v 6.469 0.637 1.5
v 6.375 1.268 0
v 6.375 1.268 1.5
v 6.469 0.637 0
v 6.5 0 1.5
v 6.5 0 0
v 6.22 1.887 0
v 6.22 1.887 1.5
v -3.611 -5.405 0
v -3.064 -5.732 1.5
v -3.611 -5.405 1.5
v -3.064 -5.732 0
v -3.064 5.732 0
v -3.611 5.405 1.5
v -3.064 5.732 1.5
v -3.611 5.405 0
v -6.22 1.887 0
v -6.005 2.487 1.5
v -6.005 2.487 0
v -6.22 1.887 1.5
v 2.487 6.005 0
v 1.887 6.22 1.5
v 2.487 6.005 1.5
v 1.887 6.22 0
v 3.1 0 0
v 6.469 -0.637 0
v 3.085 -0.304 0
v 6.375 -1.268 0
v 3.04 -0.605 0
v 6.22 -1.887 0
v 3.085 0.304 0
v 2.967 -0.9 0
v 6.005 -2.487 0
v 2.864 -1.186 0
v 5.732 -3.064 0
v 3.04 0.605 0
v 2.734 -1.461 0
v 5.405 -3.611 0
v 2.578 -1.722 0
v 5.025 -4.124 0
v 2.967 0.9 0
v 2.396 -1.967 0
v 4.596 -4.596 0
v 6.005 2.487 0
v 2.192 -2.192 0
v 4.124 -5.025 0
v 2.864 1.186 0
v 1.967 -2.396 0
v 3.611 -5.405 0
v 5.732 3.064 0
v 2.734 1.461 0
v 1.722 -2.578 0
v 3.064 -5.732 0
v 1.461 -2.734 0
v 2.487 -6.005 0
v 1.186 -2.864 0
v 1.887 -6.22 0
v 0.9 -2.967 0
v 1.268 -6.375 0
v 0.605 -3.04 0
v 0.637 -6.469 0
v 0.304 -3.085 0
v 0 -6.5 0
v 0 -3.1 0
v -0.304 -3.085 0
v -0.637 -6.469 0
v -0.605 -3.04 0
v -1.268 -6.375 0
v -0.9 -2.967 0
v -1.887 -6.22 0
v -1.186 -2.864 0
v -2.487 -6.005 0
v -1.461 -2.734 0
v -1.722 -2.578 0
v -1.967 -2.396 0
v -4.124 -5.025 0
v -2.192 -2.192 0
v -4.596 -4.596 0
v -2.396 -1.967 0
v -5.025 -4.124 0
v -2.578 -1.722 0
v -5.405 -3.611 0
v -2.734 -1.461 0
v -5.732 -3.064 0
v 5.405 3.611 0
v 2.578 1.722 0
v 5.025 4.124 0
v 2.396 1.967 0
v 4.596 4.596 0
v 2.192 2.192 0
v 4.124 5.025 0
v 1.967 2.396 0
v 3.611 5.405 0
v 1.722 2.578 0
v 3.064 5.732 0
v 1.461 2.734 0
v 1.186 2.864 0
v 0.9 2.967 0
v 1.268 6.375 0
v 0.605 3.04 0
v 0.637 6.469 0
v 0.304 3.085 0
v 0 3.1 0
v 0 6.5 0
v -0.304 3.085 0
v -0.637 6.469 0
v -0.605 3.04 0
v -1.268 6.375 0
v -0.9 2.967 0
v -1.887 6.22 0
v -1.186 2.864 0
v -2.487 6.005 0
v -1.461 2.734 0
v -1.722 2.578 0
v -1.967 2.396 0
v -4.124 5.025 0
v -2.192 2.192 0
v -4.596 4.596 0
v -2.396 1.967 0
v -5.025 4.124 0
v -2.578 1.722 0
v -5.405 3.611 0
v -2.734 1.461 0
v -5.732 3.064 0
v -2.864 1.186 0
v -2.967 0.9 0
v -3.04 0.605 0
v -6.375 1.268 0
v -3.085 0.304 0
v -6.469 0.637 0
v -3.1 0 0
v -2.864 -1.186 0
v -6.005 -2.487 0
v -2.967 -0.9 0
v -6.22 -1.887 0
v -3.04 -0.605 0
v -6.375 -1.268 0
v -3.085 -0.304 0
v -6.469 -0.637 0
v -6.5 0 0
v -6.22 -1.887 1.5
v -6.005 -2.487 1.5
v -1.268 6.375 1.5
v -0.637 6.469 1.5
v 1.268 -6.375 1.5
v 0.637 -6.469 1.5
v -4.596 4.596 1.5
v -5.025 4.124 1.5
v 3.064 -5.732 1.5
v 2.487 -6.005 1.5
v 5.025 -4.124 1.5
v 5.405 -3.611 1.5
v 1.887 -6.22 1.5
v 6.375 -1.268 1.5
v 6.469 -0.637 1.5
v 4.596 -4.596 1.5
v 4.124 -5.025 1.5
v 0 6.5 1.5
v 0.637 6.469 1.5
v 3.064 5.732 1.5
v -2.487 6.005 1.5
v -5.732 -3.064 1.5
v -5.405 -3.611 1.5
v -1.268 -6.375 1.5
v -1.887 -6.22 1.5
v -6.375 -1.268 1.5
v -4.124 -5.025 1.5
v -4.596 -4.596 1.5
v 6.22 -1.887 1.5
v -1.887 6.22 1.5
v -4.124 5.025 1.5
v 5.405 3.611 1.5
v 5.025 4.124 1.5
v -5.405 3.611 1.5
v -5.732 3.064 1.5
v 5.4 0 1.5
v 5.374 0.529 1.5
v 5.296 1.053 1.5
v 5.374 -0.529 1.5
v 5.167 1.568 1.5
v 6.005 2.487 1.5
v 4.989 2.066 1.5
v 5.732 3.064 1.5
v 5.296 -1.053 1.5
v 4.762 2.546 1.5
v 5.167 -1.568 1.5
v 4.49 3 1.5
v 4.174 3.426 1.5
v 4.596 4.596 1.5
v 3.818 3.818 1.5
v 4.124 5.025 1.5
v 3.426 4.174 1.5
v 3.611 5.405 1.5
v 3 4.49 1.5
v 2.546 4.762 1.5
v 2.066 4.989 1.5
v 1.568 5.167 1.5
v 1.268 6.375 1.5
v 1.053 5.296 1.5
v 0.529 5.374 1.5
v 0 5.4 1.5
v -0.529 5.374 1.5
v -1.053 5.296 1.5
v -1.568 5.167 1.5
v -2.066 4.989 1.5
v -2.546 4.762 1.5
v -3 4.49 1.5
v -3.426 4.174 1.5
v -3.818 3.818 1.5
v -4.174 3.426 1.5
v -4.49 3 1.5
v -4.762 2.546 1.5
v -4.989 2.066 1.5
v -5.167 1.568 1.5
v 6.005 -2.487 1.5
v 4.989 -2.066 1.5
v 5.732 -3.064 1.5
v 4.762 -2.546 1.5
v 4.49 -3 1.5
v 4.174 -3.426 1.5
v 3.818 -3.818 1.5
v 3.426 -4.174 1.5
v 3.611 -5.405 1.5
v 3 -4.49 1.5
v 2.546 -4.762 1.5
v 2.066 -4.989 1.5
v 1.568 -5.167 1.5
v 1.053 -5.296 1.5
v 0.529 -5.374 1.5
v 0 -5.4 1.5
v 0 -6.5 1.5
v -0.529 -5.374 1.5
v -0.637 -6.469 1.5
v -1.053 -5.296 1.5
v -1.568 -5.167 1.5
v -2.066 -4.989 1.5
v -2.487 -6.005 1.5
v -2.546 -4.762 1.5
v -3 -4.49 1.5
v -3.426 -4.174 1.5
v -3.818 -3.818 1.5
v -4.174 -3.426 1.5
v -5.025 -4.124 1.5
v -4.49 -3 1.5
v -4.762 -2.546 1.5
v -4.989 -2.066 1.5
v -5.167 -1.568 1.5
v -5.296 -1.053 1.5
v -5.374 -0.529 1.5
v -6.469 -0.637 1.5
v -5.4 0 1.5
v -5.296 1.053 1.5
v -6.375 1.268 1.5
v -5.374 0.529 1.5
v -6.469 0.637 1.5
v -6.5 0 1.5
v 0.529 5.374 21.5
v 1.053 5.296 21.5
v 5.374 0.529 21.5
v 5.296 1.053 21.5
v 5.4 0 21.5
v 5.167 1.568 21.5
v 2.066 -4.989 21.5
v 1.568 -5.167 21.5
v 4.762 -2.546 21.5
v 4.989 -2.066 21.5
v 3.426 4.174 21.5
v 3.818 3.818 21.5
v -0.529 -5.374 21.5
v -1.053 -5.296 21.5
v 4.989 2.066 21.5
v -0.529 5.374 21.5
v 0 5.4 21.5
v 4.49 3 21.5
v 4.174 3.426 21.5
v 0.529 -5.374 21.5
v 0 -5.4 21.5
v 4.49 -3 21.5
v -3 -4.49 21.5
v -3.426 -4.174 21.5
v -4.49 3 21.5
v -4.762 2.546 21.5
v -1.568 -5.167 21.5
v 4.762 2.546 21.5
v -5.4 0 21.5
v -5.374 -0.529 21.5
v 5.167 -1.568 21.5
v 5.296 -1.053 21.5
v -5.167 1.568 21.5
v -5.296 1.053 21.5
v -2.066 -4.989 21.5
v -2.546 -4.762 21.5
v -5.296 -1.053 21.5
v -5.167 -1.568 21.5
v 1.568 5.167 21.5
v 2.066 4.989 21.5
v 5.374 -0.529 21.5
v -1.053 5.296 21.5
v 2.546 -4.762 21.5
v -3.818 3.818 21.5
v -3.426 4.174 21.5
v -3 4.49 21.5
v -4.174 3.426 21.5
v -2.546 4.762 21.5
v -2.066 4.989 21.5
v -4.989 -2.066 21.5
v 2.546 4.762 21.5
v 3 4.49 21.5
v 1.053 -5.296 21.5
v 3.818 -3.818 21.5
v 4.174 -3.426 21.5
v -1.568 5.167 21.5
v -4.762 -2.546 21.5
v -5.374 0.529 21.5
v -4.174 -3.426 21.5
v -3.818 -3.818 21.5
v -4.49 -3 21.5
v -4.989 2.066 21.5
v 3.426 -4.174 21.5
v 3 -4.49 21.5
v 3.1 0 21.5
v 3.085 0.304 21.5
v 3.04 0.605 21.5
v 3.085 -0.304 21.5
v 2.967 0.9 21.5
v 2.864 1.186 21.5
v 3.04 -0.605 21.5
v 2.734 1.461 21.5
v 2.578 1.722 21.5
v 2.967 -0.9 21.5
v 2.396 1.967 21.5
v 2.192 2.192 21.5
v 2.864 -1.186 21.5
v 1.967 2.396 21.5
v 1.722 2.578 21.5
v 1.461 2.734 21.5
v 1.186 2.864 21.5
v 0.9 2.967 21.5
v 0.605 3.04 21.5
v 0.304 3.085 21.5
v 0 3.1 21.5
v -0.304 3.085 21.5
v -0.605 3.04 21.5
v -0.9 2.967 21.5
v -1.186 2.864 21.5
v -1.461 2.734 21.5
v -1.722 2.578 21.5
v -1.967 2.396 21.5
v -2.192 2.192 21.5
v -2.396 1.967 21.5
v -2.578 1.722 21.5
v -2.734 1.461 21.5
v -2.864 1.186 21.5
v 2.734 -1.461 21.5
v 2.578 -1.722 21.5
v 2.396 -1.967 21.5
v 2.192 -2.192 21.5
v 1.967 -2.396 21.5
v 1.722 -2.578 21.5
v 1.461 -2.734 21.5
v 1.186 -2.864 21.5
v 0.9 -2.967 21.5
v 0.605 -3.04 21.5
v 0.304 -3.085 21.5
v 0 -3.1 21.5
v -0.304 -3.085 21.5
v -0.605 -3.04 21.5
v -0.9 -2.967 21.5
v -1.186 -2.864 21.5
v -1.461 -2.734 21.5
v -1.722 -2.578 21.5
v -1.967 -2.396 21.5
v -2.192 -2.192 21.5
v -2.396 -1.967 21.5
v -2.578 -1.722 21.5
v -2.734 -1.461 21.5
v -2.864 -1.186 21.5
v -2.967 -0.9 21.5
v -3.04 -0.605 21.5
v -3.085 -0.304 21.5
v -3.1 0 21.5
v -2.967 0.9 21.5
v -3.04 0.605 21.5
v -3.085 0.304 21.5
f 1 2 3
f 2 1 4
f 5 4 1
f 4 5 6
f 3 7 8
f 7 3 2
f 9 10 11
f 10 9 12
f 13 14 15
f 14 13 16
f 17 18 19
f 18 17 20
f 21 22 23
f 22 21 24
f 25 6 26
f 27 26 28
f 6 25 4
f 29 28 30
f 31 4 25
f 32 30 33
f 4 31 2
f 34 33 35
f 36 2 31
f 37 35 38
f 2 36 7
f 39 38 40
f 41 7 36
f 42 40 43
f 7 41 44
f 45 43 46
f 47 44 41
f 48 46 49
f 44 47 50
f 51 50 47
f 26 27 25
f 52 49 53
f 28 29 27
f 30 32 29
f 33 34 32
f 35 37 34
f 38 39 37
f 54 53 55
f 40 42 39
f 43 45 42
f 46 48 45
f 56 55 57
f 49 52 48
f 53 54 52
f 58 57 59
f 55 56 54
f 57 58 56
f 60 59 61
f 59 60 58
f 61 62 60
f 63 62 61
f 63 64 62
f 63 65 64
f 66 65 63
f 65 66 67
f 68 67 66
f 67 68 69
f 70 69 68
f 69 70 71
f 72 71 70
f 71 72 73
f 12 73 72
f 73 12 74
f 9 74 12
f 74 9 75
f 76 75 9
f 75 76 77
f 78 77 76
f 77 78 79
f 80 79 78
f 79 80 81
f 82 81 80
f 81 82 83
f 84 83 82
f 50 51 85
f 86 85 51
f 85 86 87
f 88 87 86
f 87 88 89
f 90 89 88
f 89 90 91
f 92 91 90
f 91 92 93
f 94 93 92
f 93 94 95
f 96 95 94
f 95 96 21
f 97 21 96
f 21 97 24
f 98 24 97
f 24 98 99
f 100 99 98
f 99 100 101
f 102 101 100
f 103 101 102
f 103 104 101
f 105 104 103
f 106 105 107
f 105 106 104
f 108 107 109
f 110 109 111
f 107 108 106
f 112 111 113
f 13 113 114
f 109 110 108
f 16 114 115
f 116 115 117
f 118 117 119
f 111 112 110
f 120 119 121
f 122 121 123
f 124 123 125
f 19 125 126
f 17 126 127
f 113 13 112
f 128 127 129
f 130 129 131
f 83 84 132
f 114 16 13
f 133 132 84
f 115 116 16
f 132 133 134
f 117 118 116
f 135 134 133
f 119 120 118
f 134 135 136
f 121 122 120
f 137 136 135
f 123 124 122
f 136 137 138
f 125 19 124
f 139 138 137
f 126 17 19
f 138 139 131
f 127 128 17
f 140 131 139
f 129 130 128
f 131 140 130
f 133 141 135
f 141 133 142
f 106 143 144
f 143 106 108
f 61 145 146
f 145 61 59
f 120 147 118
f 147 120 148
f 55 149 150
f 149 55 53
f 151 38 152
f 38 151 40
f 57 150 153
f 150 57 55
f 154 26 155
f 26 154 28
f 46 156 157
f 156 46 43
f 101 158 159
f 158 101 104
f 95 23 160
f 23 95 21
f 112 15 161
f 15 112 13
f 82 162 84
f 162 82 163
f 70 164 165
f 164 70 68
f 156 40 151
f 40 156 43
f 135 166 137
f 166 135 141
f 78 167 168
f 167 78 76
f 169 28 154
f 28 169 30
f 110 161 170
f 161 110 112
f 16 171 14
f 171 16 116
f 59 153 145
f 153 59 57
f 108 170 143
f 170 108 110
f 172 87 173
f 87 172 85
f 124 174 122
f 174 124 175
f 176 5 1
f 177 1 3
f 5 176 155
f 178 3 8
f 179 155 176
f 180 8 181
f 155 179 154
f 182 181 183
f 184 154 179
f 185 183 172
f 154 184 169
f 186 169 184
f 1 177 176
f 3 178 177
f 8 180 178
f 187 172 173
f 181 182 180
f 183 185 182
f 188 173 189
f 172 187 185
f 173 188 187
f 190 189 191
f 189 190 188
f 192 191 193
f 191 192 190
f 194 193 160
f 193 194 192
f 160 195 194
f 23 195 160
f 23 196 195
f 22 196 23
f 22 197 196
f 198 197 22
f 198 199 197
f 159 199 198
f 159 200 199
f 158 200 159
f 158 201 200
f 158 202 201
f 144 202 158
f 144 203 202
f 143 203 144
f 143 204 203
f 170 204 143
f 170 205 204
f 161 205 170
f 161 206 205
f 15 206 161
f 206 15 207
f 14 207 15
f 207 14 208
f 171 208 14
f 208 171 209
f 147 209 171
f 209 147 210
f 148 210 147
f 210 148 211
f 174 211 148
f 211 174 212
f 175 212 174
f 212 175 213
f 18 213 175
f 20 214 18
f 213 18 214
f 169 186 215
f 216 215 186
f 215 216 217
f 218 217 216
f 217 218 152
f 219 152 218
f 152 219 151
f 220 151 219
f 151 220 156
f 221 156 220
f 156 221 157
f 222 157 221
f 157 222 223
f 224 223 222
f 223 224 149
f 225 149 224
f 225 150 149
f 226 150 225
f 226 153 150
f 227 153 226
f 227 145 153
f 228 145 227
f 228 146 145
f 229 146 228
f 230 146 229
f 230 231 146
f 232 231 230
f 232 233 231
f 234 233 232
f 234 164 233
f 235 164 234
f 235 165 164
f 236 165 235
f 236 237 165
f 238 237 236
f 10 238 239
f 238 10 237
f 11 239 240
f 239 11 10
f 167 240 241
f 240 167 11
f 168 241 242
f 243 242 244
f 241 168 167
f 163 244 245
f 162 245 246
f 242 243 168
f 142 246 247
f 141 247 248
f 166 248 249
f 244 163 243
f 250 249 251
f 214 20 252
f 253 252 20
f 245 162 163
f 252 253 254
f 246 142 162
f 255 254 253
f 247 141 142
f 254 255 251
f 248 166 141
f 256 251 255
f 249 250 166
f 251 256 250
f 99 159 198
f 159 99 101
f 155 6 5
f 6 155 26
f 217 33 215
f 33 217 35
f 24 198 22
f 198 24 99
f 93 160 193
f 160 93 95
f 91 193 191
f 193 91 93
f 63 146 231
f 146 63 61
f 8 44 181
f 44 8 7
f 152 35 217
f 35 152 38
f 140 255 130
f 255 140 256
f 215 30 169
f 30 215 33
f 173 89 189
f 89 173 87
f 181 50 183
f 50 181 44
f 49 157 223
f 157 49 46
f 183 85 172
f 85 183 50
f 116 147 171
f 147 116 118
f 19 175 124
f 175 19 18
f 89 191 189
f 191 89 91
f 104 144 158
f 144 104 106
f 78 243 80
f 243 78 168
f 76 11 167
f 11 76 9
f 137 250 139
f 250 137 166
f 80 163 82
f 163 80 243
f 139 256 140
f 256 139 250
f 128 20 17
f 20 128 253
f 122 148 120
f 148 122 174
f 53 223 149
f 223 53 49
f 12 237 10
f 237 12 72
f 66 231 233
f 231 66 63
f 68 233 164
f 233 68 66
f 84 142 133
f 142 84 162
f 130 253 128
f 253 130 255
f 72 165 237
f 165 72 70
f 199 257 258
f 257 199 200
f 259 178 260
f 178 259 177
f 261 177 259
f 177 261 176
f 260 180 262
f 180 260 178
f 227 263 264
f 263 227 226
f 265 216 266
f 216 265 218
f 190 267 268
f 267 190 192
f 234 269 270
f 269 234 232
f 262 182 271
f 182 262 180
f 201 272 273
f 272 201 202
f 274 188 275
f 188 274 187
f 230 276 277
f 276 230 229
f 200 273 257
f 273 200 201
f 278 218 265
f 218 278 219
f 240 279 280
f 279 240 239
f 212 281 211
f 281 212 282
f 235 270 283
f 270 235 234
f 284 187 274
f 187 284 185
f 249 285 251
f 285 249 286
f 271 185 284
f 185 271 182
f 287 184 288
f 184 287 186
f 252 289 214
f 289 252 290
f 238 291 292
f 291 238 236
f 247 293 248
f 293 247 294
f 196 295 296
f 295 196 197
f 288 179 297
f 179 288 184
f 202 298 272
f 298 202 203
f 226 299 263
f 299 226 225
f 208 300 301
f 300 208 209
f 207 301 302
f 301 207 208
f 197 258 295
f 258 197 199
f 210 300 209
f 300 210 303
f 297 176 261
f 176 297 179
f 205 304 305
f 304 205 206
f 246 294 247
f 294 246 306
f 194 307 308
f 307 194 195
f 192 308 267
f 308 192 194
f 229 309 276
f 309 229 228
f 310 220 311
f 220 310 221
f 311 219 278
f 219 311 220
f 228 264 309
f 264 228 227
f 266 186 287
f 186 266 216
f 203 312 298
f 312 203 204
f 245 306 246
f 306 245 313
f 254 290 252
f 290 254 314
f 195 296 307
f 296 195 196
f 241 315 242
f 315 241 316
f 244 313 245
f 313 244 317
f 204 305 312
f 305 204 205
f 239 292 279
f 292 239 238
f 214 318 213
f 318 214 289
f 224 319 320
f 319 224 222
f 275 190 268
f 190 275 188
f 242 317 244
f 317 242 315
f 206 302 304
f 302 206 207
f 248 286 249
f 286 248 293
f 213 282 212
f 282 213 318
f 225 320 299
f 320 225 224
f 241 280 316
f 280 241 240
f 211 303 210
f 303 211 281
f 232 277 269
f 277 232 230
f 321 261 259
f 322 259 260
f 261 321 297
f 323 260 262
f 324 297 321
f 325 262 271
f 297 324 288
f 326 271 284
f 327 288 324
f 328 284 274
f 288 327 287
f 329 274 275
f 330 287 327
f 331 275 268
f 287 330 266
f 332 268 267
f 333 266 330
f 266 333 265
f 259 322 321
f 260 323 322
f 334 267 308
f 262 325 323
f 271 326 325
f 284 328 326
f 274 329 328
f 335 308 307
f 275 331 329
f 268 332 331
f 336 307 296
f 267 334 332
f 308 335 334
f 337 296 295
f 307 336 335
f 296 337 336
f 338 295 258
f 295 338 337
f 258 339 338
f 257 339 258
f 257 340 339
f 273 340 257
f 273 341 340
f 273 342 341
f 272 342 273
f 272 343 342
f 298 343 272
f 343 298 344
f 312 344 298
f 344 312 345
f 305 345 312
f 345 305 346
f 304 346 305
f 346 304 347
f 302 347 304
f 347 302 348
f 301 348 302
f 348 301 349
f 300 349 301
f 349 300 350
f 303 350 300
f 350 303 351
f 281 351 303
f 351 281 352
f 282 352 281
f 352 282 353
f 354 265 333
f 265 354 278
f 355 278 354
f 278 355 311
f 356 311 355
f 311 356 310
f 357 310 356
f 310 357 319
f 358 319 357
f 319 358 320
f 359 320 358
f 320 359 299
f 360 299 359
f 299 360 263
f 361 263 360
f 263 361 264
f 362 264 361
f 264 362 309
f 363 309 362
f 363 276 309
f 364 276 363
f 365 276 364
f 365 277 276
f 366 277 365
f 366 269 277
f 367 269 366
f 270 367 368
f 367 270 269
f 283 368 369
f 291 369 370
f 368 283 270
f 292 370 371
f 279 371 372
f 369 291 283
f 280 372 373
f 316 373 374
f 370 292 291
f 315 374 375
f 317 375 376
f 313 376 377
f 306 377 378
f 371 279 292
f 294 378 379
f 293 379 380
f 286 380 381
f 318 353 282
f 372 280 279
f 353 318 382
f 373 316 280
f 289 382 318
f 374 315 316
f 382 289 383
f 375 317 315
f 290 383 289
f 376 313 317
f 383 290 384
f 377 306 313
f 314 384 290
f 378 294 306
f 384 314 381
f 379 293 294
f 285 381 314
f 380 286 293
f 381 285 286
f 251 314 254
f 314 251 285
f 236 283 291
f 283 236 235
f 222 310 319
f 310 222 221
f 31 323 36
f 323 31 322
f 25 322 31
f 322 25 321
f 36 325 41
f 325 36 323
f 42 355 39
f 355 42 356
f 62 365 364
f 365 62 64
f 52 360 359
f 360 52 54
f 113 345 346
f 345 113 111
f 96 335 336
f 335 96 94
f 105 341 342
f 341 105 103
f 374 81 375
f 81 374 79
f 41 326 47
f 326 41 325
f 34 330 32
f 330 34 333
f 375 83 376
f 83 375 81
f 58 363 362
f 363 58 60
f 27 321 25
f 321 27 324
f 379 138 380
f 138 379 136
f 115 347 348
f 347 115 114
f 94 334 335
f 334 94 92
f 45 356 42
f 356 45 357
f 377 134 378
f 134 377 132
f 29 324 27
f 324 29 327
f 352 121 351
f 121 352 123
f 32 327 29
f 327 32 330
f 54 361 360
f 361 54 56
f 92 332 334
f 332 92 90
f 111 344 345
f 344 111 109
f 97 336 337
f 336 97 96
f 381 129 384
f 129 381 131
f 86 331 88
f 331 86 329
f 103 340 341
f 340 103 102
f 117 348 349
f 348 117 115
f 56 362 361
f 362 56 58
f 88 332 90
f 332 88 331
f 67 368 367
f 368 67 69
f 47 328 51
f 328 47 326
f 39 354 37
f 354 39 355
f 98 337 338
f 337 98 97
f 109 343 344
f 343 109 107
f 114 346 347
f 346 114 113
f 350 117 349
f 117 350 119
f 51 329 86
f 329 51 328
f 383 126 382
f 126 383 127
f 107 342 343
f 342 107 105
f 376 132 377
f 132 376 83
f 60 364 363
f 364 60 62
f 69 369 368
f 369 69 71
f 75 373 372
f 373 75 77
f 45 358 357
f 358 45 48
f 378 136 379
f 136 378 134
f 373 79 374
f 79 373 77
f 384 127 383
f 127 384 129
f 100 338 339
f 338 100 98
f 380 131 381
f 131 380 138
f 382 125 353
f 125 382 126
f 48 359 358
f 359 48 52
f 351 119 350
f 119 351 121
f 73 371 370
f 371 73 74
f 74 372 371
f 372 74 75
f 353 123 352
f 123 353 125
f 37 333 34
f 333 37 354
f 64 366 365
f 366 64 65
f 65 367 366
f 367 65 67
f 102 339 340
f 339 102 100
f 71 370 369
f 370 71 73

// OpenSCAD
// PCR tube adapter sleeve: fits a 0.2 mL tube into a 1.5 mL rack hole
// Print orientation: collar on the bed (z = 0), sleeve body rises to z = 21.5

$fn = 64;

// ---- Dimensions (mm) ----
collar_d      = 13;    // collar outer diameter
collar_h      = 1.5;   // collar thickness (z = 0 to 1.5)
sleeve_od     = 10.8;  // sleeve body outer diameter
sleeve_top_z  = 21.5;  // top of sleeve body
bore_d        = 6.2;   // straight through-bore diameter

eps           = 0.5;   // cutter overshoot past faces

// ---- Model ----
difference() {
    union() {
        // Collar
        cylinder(d = collar_d, h = collar_h);
        // Sleeve body (overlaps slightly into the collar for a clean union)
        translate([0, 0, collar_h - 0.01])
            cylinder(d = sleeve_od, h = sleeve_top_z - collar_h + 0.01);
    }
    // Full-height bore, open at both ends
    translate([0, 0, -eps])
        cylinder(d = bore_d, h = sleeve_top_z + 2 * eps);
}
